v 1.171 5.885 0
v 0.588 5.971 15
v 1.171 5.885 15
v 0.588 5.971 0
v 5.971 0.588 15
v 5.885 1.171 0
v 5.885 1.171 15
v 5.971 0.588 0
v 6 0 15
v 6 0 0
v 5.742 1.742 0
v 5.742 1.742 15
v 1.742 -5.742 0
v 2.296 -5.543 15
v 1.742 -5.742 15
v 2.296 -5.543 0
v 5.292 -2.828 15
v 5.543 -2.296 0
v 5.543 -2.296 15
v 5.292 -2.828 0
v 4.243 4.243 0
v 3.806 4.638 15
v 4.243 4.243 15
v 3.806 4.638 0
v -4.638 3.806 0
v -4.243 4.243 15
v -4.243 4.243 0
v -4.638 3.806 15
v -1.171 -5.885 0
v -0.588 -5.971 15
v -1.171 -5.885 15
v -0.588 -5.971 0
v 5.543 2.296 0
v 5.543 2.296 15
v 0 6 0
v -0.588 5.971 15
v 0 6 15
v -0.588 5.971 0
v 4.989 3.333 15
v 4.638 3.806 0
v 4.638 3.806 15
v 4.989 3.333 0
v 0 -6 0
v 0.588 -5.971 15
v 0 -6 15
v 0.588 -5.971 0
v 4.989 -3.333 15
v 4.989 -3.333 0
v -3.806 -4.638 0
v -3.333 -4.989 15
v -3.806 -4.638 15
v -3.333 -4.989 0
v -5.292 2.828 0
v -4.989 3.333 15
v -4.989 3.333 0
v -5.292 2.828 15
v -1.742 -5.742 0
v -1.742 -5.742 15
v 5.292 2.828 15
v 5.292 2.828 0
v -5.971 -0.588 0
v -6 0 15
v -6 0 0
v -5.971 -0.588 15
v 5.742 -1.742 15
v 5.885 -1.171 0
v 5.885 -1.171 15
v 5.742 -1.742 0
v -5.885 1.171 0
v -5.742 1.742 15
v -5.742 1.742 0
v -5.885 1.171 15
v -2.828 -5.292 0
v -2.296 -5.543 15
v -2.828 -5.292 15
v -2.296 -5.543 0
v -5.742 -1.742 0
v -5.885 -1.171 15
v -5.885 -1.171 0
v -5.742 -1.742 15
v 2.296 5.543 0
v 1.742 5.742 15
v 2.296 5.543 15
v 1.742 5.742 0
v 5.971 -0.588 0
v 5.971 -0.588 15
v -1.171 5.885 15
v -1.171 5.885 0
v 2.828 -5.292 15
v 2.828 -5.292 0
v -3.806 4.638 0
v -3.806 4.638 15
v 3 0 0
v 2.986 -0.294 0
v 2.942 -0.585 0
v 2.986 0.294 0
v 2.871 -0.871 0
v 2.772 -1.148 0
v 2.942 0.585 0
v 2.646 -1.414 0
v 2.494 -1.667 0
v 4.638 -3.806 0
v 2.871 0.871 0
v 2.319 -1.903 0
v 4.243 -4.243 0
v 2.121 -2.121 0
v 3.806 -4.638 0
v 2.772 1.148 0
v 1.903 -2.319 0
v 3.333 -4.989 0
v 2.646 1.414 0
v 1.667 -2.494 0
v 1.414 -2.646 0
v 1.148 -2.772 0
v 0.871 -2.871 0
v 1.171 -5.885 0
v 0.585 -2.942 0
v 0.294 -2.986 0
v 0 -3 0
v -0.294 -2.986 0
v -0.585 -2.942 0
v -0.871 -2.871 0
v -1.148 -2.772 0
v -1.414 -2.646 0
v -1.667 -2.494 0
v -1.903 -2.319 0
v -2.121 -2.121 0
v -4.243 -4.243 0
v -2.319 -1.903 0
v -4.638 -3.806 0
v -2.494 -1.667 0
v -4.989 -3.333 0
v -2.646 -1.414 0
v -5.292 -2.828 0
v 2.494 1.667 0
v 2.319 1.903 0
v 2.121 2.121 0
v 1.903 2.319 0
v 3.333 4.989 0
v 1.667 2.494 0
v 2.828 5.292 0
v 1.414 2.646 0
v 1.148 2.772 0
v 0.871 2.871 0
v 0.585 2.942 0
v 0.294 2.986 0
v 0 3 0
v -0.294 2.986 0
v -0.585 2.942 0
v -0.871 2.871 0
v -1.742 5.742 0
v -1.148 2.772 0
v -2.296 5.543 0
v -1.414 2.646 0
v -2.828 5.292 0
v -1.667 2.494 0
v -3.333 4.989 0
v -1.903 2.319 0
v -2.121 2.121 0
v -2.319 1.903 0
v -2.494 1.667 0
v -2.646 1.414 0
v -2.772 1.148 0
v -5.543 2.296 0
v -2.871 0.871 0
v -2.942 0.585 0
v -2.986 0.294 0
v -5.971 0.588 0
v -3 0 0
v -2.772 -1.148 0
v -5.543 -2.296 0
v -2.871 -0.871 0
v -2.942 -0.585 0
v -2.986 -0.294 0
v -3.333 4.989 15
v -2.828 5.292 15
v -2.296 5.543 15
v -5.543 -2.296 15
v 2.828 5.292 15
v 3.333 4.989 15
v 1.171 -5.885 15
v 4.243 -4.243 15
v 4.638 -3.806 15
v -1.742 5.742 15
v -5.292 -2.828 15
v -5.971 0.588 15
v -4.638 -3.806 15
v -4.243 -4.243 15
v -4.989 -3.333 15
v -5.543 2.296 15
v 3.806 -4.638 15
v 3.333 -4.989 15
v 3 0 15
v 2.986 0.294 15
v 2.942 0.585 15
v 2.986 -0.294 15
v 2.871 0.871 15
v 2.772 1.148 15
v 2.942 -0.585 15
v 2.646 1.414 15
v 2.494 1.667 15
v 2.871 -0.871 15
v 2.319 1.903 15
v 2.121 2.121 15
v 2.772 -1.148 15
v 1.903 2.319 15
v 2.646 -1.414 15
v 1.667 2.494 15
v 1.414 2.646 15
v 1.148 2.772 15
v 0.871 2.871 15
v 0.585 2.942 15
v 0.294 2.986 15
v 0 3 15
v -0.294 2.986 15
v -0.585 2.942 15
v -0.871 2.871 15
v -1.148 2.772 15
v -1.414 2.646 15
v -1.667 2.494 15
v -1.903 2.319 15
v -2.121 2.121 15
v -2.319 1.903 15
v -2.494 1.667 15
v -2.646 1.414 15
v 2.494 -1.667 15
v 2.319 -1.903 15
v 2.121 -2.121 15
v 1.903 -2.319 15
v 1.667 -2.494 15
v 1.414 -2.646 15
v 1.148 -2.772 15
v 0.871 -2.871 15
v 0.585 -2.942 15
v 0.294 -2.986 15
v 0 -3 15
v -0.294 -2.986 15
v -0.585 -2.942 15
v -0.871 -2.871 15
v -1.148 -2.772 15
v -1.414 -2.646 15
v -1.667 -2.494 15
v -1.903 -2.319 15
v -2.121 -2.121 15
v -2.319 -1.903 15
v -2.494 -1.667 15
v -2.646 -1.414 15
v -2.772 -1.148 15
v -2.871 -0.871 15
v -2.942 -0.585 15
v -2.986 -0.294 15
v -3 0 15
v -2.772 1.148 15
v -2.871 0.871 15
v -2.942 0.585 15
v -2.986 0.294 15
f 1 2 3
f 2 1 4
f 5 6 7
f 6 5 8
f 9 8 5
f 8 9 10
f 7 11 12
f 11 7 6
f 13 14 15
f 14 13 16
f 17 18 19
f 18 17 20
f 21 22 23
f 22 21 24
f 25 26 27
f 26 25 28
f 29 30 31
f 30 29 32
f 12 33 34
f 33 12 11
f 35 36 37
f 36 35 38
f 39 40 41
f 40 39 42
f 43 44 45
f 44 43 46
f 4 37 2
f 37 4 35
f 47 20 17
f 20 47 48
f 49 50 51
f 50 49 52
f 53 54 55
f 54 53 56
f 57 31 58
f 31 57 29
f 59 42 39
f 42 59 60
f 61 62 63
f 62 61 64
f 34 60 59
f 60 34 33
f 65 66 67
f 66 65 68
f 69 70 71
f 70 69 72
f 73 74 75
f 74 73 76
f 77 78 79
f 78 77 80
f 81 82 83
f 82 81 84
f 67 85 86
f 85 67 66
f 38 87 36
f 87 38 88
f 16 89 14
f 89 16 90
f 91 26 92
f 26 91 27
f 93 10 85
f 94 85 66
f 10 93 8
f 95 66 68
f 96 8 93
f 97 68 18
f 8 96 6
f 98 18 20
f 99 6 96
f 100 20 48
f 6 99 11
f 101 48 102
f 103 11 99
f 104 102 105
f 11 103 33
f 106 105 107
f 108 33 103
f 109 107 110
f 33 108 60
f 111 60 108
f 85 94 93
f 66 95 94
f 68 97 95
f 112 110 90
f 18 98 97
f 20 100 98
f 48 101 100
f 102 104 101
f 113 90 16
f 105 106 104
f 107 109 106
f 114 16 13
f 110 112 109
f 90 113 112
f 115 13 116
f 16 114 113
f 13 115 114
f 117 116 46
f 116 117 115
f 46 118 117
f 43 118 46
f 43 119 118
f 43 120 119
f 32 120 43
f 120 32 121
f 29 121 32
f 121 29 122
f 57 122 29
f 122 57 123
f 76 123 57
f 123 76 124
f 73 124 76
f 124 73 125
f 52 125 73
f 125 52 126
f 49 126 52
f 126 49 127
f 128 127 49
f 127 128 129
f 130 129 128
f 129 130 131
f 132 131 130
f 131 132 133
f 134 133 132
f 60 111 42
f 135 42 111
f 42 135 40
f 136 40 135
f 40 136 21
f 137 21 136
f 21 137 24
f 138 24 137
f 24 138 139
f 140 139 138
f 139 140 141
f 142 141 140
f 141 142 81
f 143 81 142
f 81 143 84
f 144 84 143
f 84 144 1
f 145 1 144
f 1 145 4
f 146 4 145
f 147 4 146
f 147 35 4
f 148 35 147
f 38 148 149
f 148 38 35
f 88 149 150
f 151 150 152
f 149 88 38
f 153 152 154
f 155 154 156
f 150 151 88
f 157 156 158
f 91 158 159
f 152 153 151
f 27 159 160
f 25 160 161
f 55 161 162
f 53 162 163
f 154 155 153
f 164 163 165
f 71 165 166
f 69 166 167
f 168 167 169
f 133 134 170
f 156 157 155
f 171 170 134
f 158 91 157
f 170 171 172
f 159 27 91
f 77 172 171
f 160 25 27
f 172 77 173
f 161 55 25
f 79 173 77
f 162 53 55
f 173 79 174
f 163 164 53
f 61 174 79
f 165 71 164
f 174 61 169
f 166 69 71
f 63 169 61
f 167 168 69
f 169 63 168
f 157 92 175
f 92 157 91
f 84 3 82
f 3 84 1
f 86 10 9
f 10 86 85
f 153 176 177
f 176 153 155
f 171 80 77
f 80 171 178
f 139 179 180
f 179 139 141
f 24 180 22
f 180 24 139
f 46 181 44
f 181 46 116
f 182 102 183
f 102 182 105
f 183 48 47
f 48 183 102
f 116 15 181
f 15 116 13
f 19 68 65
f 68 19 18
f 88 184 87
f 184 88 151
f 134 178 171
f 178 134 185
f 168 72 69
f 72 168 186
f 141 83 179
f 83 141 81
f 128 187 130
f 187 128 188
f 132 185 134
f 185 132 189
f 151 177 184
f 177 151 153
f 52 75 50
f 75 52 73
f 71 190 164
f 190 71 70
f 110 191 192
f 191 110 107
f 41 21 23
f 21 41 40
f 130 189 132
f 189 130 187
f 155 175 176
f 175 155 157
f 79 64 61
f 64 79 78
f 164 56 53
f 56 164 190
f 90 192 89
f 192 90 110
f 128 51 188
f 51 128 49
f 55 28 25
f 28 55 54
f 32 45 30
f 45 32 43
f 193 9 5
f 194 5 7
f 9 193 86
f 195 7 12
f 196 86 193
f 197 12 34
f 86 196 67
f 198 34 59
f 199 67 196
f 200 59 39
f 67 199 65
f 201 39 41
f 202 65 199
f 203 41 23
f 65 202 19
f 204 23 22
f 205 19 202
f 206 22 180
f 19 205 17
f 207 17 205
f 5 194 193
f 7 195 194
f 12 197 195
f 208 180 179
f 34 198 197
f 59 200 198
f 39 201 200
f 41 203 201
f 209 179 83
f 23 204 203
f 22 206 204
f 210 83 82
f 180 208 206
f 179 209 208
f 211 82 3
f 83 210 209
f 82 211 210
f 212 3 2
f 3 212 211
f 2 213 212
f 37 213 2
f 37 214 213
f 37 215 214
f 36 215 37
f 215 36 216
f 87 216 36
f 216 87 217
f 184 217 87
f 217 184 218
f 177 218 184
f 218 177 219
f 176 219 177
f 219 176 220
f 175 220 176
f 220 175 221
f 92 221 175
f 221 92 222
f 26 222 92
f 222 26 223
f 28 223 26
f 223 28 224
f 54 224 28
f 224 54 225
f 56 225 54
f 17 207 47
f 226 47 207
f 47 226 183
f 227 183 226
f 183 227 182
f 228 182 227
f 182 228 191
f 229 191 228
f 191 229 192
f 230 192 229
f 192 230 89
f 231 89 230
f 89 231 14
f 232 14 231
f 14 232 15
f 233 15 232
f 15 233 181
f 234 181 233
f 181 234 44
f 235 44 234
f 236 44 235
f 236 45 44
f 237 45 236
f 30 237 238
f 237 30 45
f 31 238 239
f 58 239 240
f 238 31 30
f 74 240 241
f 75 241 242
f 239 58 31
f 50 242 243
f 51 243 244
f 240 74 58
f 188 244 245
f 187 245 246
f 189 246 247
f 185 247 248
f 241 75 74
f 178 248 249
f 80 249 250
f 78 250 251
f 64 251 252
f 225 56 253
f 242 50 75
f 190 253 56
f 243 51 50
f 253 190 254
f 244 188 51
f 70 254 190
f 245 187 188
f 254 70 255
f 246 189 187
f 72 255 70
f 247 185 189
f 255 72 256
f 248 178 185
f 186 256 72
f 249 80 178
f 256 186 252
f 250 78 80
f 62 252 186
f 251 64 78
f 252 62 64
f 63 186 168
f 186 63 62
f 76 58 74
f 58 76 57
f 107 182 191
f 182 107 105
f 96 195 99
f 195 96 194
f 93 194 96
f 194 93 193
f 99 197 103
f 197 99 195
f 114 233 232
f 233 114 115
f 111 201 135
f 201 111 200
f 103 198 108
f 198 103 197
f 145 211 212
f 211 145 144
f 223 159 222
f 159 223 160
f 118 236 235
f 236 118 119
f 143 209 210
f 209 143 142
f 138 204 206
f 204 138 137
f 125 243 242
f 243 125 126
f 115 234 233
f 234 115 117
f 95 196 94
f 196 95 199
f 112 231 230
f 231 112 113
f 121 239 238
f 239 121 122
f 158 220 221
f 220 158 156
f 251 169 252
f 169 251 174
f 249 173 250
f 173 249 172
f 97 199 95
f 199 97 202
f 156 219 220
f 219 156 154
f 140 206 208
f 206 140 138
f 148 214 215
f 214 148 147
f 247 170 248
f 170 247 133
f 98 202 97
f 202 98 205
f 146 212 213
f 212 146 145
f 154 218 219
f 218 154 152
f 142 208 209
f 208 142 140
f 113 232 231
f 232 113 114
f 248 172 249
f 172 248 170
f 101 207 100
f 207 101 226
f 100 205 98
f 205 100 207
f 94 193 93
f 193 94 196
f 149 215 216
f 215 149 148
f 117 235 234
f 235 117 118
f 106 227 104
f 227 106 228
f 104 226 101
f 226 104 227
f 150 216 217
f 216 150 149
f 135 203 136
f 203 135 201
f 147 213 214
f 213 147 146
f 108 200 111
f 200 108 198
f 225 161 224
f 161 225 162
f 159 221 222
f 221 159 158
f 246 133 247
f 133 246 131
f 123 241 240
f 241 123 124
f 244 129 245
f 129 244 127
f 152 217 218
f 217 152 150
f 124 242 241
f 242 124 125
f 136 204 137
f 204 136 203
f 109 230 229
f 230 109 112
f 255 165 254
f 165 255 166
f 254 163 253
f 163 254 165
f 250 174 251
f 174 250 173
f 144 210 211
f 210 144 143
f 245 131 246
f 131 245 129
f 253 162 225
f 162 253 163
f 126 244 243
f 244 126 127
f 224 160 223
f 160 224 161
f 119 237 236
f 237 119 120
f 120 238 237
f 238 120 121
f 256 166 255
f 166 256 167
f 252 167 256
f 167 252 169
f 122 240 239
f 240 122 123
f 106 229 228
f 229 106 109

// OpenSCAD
$fn = 64;
difference() {
  cylinder(h = 15, d = 12);
  translate([0, 0, -1]) cylinder(h = 17, d = 6);
}
